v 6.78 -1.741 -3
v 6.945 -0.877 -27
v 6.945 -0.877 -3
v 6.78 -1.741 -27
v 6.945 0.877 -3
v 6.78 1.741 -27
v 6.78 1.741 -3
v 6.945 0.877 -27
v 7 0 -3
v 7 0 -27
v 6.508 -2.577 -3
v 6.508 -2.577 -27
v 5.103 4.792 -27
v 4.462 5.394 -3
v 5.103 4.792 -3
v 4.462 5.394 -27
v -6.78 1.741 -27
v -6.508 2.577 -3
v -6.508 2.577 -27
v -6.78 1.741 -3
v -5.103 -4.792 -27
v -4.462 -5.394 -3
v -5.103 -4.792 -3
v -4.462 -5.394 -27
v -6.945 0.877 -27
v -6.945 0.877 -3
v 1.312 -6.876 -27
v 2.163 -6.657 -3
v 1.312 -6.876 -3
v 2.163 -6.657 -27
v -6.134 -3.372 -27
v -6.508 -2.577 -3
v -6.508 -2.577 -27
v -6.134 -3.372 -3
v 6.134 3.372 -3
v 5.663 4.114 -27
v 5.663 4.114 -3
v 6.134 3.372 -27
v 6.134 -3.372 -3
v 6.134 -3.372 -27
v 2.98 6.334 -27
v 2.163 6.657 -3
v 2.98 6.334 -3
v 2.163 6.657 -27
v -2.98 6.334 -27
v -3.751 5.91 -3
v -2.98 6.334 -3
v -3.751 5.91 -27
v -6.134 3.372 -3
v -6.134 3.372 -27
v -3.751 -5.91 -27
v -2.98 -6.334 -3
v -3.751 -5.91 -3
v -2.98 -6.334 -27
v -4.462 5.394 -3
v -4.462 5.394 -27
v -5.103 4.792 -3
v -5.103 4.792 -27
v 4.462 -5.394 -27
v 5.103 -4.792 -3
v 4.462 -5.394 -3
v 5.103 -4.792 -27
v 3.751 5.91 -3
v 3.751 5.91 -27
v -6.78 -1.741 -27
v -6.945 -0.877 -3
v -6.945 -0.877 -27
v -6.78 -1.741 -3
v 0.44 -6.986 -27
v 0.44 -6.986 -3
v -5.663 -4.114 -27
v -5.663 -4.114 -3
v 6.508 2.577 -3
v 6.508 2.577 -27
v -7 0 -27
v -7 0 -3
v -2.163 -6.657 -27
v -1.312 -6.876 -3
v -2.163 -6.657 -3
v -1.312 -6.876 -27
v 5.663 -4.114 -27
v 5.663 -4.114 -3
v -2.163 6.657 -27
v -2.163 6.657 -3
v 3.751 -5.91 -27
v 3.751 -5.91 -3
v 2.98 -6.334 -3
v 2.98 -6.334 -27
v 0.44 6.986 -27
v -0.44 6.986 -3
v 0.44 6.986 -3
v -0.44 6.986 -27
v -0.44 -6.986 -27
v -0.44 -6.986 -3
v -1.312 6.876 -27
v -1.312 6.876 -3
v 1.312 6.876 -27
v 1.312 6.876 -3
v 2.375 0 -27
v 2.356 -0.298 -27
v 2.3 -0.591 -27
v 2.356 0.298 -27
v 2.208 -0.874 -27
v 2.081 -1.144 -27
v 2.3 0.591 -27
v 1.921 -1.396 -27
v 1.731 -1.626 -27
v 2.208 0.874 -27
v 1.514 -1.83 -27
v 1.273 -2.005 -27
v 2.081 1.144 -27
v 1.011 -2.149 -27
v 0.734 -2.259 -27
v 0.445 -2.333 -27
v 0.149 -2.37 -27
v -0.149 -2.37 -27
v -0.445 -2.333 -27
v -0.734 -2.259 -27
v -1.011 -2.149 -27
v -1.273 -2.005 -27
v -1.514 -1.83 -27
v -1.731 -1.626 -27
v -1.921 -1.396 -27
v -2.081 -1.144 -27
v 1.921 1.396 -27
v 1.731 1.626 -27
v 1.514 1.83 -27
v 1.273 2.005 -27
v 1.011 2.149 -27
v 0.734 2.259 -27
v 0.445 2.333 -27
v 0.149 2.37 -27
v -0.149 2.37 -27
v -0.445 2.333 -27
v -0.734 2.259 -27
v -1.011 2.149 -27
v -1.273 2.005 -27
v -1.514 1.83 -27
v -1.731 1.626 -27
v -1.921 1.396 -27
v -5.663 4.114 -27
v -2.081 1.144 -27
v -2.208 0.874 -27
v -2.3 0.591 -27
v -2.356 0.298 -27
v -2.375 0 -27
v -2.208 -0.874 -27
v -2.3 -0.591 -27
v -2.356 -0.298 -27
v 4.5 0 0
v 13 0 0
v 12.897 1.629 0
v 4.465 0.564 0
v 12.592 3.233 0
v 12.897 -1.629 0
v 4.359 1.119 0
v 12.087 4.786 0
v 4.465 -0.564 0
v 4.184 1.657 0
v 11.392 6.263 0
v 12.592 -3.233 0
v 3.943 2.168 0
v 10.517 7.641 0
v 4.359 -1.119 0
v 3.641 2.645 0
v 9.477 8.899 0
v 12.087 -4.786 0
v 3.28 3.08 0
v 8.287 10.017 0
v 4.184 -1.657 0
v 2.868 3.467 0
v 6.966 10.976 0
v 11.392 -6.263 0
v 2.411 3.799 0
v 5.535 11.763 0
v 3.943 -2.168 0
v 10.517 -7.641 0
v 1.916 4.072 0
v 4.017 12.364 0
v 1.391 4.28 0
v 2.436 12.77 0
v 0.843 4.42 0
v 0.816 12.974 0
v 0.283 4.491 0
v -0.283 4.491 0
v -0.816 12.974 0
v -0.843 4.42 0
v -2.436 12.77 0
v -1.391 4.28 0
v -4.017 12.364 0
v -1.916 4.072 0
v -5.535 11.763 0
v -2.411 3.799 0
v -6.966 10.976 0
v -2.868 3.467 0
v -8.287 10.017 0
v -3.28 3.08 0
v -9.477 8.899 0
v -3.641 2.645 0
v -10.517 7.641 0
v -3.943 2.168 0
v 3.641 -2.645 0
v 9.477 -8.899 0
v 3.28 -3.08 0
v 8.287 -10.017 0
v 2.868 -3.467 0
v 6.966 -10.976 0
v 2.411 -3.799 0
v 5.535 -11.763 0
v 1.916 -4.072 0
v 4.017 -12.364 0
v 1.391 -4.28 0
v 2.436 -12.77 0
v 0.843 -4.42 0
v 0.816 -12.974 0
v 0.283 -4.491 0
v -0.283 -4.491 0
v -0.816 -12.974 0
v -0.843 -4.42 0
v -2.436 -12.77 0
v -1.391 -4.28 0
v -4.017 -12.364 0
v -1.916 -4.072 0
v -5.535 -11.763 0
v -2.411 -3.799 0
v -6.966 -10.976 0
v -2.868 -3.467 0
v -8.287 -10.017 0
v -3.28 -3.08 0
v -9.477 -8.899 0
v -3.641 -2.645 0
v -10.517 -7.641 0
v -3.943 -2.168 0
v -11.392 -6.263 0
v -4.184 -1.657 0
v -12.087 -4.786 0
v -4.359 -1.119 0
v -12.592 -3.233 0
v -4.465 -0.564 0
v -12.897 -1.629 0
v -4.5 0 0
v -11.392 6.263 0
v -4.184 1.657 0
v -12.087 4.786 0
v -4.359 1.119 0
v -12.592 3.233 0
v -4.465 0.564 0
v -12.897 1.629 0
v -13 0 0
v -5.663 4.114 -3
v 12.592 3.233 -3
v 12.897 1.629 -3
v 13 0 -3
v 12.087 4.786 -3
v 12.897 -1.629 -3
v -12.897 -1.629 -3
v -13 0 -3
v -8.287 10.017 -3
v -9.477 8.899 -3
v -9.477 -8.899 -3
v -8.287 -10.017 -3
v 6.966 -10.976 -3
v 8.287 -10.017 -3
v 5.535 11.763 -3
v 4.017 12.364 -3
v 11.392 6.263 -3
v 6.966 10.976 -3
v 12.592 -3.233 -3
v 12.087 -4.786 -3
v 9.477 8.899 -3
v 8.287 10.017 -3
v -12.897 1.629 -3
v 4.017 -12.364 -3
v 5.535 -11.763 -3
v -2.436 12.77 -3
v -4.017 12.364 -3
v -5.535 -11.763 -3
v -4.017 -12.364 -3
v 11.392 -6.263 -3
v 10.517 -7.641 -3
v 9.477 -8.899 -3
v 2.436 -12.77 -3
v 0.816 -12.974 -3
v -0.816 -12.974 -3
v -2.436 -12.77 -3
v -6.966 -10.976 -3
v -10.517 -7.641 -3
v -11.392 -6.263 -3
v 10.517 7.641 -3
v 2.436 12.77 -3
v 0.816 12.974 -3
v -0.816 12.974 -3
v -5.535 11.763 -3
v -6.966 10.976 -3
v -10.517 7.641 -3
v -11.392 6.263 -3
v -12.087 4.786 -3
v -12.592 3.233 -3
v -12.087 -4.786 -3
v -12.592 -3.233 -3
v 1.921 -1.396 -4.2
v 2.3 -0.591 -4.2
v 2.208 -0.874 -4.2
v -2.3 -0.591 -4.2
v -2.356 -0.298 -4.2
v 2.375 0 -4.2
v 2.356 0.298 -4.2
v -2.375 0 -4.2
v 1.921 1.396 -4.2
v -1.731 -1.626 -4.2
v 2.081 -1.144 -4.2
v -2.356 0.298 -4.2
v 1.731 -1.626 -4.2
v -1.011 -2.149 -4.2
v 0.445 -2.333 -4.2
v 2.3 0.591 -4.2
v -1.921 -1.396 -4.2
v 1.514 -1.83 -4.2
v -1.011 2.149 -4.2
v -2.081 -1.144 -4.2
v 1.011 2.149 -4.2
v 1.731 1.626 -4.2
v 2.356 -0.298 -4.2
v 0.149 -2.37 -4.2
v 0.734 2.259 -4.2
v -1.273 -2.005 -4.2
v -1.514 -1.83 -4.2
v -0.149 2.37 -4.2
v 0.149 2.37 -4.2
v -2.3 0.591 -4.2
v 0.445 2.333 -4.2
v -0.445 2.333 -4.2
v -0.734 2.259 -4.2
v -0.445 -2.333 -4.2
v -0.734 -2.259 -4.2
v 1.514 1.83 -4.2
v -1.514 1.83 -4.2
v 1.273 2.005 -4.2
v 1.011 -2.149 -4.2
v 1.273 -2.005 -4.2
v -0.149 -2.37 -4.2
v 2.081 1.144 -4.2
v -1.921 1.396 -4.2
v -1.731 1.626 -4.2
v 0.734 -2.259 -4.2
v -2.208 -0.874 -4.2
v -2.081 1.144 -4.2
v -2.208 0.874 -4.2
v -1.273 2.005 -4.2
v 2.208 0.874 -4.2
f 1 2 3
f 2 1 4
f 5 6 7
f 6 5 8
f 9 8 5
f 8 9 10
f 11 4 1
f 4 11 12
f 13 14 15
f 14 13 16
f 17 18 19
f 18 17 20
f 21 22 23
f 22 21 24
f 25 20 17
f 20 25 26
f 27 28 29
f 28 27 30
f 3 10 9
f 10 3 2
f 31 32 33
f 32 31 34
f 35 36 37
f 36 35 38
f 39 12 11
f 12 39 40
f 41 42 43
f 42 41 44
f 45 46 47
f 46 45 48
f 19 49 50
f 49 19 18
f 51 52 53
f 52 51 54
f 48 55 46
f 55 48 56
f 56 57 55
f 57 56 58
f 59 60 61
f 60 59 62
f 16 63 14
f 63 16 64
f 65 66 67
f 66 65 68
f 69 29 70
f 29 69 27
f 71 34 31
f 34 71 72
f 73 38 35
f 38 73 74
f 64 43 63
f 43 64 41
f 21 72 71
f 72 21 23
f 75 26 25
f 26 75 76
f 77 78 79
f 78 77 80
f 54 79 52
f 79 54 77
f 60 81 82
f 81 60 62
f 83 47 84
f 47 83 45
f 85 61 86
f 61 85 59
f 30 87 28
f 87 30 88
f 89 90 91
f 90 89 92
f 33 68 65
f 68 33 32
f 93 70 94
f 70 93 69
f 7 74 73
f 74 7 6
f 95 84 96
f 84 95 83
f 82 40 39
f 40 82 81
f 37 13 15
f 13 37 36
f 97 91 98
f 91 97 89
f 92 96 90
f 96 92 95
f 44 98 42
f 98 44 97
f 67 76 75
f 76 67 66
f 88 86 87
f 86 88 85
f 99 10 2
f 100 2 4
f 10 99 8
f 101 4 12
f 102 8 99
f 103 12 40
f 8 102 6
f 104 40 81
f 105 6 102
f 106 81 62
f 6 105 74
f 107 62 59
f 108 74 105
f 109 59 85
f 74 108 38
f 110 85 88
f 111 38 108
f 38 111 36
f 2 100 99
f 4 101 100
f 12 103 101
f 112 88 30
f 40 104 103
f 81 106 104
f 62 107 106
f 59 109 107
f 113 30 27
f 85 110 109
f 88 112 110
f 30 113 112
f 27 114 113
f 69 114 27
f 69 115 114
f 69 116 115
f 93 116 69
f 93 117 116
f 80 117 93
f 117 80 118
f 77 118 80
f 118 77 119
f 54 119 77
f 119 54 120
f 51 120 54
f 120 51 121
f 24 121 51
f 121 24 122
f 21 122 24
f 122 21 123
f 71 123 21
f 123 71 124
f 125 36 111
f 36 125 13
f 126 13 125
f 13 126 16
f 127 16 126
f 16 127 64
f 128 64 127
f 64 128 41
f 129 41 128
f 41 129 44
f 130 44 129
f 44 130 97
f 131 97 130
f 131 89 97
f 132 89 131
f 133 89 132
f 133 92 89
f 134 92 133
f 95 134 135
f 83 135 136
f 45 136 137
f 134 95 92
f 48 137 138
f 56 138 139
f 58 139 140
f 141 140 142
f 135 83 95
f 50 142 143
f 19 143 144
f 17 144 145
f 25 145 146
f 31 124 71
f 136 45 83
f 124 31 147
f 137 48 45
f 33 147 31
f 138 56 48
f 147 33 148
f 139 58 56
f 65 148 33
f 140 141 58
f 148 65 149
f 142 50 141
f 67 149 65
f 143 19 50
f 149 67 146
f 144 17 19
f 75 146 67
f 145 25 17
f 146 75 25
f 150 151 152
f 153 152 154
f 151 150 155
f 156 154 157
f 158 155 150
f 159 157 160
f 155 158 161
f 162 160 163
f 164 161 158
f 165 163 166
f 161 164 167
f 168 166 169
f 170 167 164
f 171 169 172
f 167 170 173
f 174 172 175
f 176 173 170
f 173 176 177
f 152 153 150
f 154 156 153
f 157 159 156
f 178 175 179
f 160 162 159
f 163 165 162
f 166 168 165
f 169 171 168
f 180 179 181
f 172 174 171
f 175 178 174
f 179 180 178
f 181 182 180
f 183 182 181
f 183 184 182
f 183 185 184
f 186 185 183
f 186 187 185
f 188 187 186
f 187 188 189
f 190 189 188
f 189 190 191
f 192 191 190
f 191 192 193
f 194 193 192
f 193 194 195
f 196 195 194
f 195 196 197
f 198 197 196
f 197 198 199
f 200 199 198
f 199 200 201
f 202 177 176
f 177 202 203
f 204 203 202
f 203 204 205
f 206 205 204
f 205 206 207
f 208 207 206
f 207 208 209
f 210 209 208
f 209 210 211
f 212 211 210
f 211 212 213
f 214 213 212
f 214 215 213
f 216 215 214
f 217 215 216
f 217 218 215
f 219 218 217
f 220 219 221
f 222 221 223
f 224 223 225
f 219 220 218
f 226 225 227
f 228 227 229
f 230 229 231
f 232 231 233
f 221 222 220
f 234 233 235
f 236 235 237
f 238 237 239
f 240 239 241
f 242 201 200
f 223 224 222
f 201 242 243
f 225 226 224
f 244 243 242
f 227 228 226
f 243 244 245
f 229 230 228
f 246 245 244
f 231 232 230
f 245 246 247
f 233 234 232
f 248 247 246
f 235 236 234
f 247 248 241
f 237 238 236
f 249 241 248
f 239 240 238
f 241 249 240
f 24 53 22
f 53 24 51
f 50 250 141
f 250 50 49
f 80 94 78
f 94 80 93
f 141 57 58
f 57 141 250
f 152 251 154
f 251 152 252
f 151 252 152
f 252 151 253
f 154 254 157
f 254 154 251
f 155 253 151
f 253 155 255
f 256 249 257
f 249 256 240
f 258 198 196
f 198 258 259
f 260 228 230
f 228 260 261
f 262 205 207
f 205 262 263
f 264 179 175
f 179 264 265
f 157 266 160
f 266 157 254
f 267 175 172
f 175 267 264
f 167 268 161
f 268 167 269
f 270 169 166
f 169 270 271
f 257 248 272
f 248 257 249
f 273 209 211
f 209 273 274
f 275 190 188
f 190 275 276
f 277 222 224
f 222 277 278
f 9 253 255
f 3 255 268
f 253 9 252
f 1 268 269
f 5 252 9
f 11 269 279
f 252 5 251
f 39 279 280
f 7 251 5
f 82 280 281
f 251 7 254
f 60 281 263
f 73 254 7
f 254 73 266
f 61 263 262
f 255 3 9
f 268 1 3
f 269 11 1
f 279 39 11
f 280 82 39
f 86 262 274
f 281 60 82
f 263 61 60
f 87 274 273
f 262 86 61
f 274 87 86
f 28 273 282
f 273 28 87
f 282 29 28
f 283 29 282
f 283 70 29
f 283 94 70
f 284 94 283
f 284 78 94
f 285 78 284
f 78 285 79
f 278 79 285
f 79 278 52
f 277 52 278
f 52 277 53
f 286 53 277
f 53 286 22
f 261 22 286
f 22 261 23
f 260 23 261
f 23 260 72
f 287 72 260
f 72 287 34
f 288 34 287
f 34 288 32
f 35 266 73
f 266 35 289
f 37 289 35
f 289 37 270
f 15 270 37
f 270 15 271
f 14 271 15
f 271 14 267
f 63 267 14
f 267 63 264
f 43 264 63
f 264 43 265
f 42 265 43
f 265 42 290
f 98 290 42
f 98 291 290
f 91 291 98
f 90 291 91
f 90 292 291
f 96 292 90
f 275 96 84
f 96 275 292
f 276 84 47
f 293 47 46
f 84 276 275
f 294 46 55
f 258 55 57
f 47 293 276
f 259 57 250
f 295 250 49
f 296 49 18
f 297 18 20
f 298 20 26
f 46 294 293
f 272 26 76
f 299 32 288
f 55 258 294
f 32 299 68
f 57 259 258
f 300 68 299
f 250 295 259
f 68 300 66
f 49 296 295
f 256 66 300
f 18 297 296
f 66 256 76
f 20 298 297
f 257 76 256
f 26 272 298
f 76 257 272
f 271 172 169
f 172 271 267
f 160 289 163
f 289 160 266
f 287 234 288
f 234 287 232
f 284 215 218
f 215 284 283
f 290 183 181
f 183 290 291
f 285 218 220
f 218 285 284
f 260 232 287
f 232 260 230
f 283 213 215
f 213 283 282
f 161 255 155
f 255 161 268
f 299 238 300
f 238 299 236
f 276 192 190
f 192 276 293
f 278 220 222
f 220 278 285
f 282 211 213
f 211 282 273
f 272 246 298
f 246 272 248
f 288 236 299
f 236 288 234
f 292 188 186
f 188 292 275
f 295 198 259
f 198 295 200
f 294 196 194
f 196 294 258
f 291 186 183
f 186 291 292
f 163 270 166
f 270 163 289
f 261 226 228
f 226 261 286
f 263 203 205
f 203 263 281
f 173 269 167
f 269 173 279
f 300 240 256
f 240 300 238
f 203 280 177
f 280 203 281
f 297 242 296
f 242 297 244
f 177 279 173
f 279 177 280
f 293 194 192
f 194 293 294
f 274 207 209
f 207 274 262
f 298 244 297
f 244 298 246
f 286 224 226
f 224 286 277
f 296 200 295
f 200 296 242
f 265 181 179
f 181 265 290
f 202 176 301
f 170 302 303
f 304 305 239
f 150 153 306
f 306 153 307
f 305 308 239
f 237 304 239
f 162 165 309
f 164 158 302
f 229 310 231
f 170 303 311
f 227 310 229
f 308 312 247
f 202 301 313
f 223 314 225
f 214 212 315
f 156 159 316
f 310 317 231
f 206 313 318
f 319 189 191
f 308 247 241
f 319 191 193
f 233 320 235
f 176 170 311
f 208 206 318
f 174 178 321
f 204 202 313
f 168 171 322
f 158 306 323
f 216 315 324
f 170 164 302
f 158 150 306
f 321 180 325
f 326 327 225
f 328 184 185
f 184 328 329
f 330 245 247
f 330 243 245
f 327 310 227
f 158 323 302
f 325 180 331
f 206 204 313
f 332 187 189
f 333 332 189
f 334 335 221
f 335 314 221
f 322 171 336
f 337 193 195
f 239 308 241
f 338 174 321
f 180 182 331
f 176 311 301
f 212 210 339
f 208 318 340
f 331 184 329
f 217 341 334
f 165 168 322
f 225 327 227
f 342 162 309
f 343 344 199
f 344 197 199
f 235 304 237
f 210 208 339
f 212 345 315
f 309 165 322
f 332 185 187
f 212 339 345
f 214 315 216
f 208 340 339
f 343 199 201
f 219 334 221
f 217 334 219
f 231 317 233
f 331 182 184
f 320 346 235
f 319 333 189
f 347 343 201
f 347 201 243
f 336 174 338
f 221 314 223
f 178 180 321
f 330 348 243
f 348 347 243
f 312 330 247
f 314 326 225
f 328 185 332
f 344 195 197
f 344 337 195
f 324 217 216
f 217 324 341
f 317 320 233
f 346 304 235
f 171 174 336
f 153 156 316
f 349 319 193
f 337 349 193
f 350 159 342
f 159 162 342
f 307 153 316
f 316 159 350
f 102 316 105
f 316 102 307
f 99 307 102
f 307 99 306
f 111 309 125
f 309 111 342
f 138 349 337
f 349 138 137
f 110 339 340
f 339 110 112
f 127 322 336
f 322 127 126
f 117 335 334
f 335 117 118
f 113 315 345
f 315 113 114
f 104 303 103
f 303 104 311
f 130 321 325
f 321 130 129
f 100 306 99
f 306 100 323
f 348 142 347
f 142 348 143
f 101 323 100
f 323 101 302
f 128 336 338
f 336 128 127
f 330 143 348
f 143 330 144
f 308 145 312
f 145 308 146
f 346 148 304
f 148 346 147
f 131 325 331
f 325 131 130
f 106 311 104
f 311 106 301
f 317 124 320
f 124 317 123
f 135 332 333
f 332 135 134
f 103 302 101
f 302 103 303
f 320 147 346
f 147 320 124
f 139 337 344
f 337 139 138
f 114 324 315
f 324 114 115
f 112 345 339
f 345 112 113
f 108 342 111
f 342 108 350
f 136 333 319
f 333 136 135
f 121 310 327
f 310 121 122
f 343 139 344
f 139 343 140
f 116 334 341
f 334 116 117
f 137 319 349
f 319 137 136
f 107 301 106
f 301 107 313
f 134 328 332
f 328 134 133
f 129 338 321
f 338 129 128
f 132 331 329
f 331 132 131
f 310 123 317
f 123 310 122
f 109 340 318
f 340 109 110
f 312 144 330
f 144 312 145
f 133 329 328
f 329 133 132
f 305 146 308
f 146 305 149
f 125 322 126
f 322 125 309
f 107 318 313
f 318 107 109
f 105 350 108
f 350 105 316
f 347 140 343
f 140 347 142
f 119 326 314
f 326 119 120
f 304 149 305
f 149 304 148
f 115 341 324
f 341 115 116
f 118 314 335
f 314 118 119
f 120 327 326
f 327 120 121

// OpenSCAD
$fn = 50;


difference() {
	union() {
		translate(v = [0, 0, -27.0000000000]) {
			cylinder(h = 27, r = 7.0000000000);
		}
		translate(v = [0, 0, -3.0000000000]) {
			cylinder(h = 3, r = 13.0000000000);
		}
	}
	union() {
		translate(v = [0, 0, 0]) {
			rotate(a = [0, 0, 0]) {
				difference() {
					union() {
						#translate(v = [0, 0, -27.0000000000]) {
							cylinder(h = 27, r = 2.2500000000);
						}
						#translate(v = [0, 0, -4.2000000000]) {
							cylinder(h = 4.2000000000, r1 = 2.3750000000, r2 = 4.5000000000);
						}
						#translate(v = [0, 0, -27.0000000000]) {
							cylinder(h = 27, r = 2.3750000000);
						}
						#translate(v = [0, 0, -27.0000000000]) {
							cylinder(h = 27, r = 2.2500000000);
						}
					}
					union();
				}
			}
		}
	}
}
